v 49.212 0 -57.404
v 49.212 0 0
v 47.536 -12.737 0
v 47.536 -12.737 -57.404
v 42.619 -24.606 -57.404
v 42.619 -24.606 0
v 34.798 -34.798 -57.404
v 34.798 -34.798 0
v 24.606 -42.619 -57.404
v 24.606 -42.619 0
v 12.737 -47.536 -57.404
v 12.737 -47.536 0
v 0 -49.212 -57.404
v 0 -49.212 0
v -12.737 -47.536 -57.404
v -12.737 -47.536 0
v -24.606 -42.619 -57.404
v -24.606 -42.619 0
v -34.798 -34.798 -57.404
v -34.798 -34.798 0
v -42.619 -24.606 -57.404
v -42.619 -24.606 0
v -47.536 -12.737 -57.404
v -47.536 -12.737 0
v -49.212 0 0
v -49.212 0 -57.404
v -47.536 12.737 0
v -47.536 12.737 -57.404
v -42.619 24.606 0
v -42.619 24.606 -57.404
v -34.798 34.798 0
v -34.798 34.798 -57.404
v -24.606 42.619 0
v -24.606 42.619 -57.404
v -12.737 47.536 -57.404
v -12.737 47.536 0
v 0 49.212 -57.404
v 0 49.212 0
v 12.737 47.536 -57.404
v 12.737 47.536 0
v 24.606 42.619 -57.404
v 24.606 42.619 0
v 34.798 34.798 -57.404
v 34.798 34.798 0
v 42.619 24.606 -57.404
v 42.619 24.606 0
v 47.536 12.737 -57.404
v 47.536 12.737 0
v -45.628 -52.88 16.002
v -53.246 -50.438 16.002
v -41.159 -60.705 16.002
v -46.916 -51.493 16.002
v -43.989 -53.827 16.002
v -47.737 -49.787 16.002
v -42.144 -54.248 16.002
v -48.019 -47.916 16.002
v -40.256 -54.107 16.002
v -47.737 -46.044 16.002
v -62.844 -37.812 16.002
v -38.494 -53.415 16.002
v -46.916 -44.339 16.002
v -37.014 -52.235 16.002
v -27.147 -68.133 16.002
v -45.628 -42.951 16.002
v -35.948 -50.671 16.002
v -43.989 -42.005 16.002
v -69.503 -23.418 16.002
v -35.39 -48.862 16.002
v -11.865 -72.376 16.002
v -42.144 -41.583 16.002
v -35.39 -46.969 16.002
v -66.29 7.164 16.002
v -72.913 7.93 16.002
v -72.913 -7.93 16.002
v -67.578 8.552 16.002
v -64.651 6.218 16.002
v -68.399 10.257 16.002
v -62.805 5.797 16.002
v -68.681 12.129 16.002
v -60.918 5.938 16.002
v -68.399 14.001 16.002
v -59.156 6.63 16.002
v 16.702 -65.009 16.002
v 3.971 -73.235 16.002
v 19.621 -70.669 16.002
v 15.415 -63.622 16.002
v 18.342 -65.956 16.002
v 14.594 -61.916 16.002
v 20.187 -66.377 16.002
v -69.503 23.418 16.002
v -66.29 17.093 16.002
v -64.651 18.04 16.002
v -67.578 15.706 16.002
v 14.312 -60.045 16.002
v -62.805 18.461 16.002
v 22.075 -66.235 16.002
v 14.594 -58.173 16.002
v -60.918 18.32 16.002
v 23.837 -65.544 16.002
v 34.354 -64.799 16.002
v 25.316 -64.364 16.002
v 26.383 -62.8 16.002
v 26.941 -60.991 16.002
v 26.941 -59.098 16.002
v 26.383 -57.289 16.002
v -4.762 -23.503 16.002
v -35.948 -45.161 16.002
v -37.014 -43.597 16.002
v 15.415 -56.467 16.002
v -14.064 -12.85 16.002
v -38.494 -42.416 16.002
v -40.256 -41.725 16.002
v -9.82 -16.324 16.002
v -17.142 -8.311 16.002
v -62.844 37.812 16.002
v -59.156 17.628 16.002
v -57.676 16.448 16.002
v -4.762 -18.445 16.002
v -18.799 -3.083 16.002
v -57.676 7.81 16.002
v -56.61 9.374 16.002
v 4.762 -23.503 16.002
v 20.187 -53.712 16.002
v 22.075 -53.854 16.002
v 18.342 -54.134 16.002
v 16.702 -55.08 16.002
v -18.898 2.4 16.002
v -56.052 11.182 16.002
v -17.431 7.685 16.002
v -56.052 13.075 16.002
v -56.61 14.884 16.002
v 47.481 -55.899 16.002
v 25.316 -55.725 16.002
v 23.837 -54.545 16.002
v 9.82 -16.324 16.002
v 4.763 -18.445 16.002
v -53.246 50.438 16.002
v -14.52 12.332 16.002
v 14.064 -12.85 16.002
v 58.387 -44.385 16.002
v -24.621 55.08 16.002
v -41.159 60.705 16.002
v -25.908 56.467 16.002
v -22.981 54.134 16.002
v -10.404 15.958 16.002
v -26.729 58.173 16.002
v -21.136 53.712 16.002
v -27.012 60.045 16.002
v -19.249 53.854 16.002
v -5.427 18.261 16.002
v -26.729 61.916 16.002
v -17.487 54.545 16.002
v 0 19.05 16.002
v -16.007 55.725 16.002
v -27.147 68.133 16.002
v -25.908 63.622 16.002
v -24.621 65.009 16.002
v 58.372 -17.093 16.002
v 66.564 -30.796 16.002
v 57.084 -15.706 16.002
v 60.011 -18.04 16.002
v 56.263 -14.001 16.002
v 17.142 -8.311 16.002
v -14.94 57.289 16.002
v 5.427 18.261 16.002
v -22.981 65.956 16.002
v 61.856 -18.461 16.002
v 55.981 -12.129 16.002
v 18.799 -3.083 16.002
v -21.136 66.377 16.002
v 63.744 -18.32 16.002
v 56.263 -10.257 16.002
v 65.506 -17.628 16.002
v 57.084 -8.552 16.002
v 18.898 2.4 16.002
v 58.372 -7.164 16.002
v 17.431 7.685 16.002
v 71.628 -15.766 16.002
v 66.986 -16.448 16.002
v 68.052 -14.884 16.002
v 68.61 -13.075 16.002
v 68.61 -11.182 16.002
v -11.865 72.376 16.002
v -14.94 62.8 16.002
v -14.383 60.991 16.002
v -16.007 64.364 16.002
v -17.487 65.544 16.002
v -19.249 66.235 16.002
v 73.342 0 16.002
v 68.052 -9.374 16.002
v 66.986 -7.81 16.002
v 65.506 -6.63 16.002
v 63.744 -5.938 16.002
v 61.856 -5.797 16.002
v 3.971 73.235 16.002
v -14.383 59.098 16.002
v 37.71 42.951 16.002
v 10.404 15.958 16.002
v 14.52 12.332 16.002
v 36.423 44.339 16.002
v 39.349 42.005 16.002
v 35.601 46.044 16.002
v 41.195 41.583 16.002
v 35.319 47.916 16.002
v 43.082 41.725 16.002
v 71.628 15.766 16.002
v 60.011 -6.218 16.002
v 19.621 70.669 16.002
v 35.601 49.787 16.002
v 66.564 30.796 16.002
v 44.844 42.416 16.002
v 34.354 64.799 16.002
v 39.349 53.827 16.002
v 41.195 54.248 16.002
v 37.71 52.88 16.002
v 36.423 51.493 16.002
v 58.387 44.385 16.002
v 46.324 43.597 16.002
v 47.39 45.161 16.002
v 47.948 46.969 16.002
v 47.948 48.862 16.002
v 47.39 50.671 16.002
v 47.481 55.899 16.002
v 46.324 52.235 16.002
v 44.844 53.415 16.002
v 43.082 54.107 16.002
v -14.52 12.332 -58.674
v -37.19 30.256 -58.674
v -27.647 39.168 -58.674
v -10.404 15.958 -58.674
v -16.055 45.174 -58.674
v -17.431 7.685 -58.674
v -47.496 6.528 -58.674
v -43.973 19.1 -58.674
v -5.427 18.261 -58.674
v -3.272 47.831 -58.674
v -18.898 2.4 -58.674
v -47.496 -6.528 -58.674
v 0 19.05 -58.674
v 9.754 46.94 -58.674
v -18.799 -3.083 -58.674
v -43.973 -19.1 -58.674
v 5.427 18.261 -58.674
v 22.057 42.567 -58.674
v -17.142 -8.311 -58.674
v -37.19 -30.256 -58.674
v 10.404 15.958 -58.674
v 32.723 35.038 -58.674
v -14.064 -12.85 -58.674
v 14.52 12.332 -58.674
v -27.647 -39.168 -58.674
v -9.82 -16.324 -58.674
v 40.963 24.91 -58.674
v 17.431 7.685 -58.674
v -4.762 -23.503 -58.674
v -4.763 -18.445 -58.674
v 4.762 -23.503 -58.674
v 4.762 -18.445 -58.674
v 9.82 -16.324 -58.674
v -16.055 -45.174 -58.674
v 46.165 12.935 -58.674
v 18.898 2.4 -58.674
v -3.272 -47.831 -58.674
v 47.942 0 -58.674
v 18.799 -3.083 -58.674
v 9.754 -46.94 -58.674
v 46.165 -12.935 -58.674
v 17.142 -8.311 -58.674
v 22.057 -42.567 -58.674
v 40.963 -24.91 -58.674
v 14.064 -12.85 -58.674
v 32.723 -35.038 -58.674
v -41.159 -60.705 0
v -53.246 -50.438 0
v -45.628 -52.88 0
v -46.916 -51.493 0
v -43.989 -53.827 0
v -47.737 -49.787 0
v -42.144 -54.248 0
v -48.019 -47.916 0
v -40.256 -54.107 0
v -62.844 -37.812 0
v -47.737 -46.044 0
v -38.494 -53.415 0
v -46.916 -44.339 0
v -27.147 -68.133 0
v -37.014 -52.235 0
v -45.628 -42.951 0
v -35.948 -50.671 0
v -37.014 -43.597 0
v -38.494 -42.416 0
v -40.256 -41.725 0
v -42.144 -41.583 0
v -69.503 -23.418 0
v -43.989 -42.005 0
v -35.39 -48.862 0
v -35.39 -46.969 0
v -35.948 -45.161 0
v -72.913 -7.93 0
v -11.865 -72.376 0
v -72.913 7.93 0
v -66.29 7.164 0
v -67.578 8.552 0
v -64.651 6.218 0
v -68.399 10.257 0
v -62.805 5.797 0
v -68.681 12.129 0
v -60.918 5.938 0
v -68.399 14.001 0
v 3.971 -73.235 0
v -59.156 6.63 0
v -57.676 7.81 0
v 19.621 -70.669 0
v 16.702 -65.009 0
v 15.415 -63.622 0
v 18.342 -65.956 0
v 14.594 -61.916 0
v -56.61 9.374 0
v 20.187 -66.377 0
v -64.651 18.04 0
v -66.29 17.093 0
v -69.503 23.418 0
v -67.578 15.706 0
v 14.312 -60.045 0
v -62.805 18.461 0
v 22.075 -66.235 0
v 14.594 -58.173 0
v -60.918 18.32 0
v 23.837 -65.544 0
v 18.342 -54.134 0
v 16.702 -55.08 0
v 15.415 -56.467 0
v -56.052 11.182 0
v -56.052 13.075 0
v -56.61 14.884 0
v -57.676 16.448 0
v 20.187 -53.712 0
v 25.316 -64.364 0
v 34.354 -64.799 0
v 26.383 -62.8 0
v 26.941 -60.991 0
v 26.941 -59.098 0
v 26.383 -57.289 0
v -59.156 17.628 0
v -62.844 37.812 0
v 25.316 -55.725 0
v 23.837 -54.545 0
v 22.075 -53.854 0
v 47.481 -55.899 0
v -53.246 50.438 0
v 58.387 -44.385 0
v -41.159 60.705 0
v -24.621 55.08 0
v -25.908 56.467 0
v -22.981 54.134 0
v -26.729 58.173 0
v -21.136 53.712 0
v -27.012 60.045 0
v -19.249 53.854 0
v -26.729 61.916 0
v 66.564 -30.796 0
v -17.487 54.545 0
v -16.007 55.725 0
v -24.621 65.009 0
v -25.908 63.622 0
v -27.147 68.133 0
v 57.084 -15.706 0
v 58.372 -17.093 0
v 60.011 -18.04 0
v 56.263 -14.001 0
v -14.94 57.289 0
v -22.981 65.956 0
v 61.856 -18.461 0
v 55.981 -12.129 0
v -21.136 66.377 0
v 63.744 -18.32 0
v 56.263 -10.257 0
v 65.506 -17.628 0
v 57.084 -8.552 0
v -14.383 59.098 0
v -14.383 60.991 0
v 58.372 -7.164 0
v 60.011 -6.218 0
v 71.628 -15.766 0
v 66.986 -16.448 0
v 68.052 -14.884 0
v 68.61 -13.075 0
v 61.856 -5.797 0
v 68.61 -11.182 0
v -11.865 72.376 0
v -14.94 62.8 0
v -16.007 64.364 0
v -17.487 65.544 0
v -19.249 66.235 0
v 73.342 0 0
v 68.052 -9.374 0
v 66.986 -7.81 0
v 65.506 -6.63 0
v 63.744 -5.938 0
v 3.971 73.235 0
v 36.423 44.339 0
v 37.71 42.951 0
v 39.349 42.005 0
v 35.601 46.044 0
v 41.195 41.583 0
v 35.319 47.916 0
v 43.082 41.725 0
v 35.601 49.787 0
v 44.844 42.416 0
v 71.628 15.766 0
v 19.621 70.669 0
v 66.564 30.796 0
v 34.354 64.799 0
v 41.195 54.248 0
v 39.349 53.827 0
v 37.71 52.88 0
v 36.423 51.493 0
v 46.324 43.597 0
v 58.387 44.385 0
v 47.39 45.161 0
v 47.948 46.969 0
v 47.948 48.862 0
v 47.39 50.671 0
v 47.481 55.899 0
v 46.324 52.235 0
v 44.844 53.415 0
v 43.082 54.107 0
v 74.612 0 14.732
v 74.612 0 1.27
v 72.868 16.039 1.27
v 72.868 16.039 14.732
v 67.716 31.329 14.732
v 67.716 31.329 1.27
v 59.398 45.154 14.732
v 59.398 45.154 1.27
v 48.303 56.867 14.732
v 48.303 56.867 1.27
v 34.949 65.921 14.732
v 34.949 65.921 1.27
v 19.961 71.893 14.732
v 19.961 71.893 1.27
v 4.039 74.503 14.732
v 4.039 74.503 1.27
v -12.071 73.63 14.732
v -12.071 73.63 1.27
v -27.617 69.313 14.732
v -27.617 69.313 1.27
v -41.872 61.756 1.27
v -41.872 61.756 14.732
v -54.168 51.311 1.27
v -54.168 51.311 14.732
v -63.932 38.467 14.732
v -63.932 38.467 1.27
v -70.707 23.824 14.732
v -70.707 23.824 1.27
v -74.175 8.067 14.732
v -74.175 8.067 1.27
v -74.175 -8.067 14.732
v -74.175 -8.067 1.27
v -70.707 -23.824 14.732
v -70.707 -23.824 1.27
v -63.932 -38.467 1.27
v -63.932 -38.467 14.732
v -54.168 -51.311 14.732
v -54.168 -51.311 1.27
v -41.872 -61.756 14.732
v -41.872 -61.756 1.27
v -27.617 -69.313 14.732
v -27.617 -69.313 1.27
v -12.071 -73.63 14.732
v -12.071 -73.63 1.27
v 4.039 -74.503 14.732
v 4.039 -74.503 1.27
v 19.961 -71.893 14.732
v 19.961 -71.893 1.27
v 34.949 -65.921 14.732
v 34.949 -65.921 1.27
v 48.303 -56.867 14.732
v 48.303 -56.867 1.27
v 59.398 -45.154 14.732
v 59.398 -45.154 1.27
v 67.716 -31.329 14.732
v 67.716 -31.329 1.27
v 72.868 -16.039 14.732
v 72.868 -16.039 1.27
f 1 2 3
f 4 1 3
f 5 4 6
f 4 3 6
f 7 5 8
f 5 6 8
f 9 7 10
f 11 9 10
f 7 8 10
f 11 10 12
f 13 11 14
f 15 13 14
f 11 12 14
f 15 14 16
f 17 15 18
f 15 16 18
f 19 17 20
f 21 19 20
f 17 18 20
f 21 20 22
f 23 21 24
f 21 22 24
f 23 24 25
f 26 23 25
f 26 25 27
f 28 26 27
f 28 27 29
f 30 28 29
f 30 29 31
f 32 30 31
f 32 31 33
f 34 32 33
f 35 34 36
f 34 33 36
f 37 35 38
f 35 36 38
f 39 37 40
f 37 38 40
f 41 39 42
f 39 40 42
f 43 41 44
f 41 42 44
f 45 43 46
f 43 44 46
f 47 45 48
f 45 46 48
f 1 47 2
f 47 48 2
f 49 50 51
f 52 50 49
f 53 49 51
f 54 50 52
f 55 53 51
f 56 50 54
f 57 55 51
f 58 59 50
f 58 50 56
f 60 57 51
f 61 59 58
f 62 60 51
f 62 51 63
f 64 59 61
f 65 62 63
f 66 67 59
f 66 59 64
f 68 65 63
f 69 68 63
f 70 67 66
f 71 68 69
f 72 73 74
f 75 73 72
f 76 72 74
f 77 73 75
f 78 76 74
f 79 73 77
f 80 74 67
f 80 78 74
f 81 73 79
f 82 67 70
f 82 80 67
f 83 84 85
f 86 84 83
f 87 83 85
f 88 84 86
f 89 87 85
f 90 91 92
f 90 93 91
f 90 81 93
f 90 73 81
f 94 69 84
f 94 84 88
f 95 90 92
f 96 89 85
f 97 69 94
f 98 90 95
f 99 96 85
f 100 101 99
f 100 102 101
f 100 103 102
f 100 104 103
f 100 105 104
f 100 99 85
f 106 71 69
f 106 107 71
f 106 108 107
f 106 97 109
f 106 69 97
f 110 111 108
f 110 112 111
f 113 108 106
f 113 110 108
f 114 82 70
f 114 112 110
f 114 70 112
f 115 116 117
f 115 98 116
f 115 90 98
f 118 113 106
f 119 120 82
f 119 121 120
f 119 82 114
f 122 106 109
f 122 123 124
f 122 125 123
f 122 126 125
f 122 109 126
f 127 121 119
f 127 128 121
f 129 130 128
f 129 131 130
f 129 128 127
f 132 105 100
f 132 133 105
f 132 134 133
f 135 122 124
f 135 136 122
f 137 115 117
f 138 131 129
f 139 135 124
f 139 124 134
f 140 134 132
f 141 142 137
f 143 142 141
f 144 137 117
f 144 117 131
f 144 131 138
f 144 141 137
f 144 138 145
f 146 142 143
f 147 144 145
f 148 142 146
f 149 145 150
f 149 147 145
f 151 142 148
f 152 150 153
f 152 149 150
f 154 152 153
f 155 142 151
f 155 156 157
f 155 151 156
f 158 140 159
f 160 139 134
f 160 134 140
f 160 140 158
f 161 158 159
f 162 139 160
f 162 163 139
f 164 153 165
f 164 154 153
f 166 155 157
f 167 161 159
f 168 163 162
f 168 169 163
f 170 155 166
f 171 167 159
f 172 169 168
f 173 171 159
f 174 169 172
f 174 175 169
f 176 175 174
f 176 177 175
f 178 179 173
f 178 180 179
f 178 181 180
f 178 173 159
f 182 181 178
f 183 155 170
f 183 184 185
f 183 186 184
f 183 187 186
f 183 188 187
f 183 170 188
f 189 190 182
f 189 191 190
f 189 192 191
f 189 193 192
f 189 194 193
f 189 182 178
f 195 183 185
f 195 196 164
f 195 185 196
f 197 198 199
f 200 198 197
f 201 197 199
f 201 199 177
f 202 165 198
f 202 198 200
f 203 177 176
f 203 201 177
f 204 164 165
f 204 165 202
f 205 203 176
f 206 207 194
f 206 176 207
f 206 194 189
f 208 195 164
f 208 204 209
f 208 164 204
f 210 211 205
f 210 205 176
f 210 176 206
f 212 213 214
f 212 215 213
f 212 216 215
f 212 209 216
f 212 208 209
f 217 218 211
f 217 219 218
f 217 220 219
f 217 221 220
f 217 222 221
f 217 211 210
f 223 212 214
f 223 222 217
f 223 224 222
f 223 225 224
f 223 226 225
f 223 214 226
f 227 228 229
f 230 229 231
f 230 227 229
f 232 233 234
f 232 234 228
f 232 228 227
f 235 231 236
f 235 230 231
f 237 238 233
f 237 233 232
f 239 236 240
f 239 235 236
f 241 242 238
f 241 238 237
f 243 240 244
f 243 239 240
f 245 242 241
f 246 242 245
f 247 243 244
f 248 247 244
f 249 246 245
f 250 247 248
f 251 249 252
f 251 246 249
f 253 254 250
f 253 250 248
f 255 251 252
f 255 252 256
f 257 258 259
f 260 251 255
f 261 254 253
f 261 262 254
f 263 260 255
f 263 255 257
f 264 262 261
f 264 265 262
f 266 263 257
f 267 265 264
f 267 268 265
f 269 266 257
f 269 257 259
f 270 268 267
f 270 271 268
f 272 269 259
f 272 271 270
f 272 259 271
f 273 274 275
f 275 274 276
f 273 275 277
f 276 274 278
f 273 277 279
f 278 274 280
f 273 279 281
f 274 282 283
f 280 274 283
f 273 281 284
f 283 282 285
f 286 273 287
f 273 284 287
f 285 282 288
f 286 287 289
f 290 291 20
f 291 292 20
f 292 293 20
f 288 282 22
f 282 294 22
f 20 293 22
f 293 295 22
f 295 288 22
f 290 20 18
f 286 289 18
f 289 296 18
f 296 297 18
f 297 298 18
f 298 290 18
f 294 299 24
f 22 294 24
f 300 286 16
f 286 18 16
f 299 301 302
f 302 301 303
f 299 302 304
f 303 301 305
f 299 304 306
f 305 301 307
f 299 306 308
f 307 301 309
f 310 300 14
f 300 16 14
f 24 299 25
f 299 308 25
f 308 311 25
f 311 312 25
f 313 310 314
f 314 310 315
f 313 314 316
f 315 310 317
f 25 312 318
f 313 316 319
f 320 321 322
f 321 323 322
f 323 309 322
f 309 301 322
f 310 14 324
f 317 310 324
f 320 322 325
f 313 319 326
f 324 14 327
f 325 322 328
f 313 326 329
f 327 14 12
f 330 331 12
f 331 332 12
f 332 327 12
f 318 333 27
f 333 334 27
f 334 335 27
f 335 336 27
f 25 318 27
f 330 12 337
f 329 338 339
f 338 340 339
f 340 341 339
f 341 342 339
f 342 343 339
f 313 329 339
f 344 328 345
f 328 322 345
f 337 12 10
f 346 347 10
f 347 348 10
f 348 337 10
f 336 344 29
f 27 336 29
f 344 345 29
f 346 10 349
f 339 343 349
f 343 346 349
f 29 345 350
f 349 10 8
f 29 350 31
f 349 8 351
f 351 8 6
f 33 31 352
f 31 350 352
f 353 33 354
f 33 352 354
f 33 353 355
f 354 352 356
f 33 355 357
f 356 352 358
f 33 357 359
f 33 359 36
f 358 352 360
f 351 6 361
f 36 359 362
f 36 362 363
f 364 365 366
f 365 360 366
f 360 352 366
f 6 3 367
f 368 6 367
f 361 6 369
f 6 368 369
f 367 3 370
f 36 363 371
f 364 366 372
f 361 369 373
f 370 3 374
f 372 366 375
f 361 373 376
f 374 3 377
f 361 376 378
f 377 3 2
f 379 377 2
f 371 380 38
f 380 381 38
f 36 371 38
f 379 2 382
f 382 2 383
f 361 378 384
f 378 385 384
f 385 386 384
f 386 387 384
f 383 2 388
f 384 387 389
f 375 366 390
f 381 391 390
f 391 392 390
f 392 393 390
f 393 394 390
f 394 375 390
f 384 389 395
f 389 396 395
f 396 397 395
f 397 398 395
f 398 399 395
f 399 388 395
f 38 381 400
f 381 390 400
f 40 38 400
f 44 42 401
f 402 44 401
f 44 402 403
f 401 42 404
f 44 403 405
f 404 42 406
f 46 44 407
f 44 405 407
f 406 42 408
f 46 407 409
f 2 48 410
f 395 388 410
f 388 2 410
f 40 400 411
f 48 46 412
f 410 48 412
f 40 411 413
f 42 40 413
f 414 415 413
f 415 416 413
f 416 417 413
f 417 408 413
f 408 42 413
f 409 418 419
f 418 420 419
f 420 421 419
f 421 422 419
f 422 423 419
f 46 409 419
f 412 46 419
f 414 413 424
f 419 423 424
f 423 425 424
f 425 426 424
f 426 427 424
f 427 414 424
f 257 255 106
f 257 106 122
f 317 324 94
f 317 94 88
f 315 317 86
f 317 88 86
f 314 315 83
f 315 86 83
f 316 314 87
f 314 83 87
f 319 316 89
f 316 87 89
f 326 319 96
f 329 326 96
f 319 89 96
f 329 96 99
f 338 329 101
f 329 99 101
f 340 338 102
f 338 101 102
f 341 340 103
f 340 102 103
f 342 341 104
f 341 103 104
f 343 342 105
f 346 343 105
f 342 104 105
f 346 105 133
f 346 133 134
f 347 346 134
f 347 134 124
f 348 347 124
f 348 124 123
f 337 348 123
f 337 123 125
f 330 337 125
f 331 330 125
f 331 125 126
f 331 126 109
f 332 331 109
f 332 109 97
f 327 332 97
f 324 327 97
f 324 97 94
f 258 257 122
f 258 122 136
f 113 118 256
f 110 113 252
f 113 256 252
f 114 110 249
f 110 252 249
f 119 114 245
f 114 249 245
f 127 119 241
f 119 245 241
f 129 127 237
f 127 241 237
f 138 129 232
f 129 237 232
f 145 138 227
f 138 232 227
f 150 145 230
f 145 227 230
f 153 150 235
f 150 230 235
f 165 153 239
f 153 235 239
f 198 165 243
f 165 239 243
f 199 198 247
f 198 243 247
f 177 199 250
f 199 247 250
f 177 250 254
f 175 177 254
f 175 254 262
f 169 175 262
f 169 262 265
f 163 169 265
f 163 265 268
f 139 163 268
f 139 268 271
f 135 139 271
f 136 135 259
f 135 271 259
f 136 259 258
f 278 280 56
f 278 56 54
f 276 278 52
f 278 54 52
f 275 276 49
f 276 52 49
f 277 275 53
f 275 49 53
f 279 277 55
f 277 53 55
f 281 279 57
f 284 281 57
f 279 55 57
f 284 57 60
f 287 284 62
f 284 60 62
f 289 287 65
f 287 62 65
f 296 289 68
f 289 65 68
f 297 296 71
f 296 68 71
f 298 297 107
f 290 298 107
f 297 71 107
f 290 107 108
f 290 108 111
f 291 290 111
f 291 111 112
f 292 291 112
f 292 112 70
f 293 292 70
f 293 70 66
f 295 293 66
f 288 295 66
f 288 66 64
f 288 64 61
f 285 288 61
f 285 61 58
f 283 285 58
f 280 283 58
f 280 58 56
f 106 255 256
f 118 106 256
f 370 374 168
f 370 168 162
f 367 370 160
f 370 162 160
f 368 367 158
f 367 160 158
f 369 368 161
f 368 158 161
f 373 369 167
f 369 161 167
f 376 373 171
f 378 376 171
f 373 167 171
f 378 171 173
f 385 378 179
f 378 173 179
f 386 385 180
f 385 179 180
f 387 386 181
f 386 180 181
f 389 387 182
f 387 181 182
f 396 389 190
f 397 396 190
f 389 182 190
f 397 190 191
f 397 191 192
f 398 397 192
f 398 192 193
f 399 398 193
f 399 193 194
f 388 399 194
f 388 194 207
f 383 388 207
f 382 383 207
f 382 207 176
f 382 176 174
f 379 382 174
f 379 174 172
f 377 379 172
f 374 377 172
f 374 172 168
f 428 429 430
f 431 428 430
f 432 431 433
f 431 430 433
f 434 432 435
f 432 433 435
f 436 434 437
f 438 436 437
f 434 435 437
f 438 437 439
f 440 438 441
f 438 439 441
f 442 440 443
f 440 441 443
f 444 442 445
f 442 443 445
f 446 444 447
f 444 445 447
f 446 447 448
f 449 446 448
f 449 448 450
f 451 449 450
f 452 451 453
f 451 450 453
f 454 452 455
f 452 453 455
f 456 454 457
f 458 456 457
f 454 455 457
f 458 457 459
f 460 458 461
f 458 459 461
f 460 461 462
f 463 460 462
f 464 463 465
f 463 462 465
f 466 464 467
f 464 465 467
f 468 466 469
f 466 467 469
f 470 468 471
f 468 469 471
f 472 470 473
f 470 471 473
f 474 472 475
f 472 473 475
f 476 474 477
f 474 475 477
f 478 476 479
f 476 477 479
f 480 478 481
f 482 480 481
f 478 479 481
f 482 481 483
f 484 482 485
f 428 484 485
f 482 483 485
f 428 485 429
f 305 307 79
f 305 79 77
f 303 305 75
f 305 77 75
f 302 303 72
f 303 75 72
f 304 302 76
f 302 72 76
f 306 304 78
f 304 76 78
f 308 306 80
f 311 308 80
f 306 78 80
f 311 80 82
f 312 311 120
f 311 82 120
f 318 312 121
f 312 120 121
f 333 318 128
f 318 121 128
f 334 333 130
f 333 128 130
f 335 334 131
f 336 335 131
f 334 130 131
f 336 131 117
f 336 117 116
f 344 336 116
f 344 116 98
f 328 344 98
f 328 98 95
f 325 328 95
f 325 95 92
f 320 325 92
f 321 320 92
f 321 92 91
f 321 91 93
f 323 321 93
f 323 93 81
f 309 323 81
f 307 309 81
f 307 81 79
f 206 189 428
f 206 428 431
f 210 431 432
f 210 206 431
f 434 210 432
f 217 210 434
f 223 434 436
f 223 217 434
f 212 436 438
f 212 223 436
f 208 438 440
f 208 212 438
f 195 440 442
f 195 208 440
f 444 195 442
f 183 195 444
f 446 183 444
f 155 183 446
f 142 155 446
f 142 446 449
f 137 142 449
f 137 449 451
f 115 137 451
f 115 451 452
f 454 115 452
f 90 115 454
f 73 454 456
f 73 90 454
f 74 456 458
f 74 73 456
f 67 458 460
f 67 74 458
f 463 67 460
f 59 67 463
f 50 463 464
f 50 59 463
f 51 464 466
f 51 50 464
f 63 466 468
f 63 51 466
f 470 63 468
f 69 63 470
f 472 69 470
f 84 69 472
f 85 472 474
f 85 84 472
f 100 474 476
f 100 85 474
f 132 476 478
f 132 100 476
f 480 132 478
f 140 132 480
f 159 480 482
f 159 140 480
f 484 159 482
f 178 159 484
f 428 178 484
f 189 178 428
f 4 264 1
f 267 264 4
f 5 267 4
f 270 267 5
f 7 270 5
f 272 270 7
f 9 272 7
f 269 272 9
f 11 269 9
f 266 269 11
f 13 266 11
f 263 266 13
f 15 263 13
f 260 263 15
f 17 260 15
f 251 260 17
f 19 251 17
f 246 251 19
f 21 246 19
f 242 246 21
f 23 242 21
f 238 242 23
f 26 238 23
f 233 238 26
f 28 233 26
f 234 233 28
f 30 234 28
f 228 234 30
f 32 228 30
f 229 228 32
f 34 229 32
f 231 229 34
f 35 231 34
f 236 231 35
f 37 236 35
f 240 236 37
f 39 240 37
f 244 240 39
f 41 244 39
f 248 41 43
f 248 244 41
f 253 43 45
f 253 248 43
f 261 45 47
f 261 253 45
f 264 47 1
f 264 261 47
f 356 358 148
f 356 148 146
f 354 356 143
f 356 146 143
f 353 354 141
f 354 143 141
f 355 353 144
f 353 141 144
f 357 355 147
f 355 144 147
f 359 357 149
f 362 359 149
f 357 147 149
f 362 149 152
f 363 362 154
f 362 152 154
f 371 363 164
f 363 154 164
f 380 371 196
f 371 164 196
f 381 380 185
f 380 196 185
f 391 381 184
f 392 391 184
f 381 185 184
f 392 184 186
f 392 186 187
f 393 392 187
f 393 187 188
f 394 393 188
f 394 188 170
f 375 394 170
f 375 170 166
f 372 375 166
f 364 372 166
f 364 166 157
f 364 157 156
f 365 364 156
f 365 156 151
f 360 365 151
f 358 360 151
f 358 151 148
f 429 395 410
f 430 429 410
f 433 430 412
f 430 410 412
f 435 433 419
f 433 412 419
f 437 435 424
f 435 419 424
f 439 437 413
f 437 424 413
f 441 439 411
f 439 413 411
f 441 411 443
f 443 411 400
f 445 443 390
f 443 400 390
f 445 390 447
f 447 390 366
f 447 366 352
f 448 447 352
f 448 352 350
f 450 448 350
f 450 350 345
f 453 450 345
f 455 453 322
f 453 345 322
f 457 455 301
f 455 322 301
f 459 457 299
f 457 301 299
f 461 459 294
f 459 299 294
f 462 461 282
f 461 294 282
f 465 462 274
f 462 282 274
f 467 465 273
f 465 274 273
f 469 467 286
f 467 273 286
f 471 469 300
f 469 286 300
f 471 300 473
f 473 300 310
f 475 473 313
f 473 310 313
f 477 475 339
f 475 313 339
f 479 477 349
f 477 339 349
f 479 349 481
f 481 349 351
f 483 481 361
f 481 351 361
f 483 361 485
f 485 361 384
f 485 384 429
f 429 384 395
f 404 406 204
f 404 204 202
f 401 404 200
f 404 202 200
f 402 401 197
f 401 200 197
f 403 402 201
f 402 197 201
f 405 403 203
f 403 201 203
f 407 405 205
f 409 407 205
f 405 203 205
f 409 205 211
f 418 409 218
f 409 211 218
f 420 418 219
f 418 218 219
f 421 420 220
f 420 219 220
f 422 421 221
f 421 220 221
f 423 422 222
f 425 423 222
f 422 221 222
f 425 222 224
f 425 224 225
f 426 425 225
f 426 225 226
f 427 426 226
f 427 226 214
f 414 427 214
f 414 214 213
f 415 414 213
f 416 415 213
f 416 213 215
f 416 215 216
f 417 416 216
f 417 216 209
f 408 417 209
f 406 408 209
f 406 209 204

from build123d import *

# Parameters (mm, degrees)
F0_R      = 74.6125
F1_DEPTH  = 16.002
F2_R      = 49.2125
F3_DEPTH  = 58.674
F4_R      = 19.05
F5_DEPTH  = 74.677
F6_SIZE   = 1.27
F8_D      = 12.7
F8_DEPTH  = 19.05
F9_W      = 9.525
F9_H      = 27.94
F10_DEPTH = 74.677


with BuildPart() as f1:
    # F0 (on Top) → F1 (new body)
    with BuildSketch(Plane.XY):
        Circle(F0_R)
    extrude(amount=F1_DEPTH)

    # F2 (on face) → F3 (join)
    with BuildSketch(Plane(origin=(0, 0, 0), x_dir=(1, 0, 0), z_dir=(0, 0, -1))):
        Circle(F2_R)
    extrude(amount=F3_DEPTH)

    # F4 (on face) → F5 (cut, through all)
    with BuildSketch(Plane(origin=(0, 0, -58.674), x_dir=(1, 0, 0), z_dir=(0, 0, -1))):
        Circle(F4_R)
    extrude(amount=-F5_DEPTH, mode=Mode.SUBTRACT)

    # F6
    f6_edges = [f1.edges().sort_by_distance(p)[0] for p in [
        (-49.2125, 0, -58.674),
        (-74.6125, 0, 0),
        (-74.6125, 0, 16.002),
    ]]
    chamfer(f6_edges, length=F6_SIZE)

    # F8
    with Locations(Plane(origin=(0, 0, 0), x_dir=(1, 0, 0), z_dir=(0, 0, -1))):
        with Locations((-41.669327, 47.91573), (20.661576, 60.044561), (62.330903, 12.128831), (41.669327, -47.91573), (-20.661576, -60.044561), (-62.330903, -12.128831)):
            Hole(F8_D / 2, depth=F8_DEPTH)

    # F9 (on face) → F10 (cut, through all)
    with BuildSketch(Plane.XY.offset(16.002)):
        with Locations((0, -9.532987)):
            Rectangle(F9_W, F9_H)
    extrude(amount=-F10_DEPTH, mode=Mode.SUBTRACT)


solid = f1.part
